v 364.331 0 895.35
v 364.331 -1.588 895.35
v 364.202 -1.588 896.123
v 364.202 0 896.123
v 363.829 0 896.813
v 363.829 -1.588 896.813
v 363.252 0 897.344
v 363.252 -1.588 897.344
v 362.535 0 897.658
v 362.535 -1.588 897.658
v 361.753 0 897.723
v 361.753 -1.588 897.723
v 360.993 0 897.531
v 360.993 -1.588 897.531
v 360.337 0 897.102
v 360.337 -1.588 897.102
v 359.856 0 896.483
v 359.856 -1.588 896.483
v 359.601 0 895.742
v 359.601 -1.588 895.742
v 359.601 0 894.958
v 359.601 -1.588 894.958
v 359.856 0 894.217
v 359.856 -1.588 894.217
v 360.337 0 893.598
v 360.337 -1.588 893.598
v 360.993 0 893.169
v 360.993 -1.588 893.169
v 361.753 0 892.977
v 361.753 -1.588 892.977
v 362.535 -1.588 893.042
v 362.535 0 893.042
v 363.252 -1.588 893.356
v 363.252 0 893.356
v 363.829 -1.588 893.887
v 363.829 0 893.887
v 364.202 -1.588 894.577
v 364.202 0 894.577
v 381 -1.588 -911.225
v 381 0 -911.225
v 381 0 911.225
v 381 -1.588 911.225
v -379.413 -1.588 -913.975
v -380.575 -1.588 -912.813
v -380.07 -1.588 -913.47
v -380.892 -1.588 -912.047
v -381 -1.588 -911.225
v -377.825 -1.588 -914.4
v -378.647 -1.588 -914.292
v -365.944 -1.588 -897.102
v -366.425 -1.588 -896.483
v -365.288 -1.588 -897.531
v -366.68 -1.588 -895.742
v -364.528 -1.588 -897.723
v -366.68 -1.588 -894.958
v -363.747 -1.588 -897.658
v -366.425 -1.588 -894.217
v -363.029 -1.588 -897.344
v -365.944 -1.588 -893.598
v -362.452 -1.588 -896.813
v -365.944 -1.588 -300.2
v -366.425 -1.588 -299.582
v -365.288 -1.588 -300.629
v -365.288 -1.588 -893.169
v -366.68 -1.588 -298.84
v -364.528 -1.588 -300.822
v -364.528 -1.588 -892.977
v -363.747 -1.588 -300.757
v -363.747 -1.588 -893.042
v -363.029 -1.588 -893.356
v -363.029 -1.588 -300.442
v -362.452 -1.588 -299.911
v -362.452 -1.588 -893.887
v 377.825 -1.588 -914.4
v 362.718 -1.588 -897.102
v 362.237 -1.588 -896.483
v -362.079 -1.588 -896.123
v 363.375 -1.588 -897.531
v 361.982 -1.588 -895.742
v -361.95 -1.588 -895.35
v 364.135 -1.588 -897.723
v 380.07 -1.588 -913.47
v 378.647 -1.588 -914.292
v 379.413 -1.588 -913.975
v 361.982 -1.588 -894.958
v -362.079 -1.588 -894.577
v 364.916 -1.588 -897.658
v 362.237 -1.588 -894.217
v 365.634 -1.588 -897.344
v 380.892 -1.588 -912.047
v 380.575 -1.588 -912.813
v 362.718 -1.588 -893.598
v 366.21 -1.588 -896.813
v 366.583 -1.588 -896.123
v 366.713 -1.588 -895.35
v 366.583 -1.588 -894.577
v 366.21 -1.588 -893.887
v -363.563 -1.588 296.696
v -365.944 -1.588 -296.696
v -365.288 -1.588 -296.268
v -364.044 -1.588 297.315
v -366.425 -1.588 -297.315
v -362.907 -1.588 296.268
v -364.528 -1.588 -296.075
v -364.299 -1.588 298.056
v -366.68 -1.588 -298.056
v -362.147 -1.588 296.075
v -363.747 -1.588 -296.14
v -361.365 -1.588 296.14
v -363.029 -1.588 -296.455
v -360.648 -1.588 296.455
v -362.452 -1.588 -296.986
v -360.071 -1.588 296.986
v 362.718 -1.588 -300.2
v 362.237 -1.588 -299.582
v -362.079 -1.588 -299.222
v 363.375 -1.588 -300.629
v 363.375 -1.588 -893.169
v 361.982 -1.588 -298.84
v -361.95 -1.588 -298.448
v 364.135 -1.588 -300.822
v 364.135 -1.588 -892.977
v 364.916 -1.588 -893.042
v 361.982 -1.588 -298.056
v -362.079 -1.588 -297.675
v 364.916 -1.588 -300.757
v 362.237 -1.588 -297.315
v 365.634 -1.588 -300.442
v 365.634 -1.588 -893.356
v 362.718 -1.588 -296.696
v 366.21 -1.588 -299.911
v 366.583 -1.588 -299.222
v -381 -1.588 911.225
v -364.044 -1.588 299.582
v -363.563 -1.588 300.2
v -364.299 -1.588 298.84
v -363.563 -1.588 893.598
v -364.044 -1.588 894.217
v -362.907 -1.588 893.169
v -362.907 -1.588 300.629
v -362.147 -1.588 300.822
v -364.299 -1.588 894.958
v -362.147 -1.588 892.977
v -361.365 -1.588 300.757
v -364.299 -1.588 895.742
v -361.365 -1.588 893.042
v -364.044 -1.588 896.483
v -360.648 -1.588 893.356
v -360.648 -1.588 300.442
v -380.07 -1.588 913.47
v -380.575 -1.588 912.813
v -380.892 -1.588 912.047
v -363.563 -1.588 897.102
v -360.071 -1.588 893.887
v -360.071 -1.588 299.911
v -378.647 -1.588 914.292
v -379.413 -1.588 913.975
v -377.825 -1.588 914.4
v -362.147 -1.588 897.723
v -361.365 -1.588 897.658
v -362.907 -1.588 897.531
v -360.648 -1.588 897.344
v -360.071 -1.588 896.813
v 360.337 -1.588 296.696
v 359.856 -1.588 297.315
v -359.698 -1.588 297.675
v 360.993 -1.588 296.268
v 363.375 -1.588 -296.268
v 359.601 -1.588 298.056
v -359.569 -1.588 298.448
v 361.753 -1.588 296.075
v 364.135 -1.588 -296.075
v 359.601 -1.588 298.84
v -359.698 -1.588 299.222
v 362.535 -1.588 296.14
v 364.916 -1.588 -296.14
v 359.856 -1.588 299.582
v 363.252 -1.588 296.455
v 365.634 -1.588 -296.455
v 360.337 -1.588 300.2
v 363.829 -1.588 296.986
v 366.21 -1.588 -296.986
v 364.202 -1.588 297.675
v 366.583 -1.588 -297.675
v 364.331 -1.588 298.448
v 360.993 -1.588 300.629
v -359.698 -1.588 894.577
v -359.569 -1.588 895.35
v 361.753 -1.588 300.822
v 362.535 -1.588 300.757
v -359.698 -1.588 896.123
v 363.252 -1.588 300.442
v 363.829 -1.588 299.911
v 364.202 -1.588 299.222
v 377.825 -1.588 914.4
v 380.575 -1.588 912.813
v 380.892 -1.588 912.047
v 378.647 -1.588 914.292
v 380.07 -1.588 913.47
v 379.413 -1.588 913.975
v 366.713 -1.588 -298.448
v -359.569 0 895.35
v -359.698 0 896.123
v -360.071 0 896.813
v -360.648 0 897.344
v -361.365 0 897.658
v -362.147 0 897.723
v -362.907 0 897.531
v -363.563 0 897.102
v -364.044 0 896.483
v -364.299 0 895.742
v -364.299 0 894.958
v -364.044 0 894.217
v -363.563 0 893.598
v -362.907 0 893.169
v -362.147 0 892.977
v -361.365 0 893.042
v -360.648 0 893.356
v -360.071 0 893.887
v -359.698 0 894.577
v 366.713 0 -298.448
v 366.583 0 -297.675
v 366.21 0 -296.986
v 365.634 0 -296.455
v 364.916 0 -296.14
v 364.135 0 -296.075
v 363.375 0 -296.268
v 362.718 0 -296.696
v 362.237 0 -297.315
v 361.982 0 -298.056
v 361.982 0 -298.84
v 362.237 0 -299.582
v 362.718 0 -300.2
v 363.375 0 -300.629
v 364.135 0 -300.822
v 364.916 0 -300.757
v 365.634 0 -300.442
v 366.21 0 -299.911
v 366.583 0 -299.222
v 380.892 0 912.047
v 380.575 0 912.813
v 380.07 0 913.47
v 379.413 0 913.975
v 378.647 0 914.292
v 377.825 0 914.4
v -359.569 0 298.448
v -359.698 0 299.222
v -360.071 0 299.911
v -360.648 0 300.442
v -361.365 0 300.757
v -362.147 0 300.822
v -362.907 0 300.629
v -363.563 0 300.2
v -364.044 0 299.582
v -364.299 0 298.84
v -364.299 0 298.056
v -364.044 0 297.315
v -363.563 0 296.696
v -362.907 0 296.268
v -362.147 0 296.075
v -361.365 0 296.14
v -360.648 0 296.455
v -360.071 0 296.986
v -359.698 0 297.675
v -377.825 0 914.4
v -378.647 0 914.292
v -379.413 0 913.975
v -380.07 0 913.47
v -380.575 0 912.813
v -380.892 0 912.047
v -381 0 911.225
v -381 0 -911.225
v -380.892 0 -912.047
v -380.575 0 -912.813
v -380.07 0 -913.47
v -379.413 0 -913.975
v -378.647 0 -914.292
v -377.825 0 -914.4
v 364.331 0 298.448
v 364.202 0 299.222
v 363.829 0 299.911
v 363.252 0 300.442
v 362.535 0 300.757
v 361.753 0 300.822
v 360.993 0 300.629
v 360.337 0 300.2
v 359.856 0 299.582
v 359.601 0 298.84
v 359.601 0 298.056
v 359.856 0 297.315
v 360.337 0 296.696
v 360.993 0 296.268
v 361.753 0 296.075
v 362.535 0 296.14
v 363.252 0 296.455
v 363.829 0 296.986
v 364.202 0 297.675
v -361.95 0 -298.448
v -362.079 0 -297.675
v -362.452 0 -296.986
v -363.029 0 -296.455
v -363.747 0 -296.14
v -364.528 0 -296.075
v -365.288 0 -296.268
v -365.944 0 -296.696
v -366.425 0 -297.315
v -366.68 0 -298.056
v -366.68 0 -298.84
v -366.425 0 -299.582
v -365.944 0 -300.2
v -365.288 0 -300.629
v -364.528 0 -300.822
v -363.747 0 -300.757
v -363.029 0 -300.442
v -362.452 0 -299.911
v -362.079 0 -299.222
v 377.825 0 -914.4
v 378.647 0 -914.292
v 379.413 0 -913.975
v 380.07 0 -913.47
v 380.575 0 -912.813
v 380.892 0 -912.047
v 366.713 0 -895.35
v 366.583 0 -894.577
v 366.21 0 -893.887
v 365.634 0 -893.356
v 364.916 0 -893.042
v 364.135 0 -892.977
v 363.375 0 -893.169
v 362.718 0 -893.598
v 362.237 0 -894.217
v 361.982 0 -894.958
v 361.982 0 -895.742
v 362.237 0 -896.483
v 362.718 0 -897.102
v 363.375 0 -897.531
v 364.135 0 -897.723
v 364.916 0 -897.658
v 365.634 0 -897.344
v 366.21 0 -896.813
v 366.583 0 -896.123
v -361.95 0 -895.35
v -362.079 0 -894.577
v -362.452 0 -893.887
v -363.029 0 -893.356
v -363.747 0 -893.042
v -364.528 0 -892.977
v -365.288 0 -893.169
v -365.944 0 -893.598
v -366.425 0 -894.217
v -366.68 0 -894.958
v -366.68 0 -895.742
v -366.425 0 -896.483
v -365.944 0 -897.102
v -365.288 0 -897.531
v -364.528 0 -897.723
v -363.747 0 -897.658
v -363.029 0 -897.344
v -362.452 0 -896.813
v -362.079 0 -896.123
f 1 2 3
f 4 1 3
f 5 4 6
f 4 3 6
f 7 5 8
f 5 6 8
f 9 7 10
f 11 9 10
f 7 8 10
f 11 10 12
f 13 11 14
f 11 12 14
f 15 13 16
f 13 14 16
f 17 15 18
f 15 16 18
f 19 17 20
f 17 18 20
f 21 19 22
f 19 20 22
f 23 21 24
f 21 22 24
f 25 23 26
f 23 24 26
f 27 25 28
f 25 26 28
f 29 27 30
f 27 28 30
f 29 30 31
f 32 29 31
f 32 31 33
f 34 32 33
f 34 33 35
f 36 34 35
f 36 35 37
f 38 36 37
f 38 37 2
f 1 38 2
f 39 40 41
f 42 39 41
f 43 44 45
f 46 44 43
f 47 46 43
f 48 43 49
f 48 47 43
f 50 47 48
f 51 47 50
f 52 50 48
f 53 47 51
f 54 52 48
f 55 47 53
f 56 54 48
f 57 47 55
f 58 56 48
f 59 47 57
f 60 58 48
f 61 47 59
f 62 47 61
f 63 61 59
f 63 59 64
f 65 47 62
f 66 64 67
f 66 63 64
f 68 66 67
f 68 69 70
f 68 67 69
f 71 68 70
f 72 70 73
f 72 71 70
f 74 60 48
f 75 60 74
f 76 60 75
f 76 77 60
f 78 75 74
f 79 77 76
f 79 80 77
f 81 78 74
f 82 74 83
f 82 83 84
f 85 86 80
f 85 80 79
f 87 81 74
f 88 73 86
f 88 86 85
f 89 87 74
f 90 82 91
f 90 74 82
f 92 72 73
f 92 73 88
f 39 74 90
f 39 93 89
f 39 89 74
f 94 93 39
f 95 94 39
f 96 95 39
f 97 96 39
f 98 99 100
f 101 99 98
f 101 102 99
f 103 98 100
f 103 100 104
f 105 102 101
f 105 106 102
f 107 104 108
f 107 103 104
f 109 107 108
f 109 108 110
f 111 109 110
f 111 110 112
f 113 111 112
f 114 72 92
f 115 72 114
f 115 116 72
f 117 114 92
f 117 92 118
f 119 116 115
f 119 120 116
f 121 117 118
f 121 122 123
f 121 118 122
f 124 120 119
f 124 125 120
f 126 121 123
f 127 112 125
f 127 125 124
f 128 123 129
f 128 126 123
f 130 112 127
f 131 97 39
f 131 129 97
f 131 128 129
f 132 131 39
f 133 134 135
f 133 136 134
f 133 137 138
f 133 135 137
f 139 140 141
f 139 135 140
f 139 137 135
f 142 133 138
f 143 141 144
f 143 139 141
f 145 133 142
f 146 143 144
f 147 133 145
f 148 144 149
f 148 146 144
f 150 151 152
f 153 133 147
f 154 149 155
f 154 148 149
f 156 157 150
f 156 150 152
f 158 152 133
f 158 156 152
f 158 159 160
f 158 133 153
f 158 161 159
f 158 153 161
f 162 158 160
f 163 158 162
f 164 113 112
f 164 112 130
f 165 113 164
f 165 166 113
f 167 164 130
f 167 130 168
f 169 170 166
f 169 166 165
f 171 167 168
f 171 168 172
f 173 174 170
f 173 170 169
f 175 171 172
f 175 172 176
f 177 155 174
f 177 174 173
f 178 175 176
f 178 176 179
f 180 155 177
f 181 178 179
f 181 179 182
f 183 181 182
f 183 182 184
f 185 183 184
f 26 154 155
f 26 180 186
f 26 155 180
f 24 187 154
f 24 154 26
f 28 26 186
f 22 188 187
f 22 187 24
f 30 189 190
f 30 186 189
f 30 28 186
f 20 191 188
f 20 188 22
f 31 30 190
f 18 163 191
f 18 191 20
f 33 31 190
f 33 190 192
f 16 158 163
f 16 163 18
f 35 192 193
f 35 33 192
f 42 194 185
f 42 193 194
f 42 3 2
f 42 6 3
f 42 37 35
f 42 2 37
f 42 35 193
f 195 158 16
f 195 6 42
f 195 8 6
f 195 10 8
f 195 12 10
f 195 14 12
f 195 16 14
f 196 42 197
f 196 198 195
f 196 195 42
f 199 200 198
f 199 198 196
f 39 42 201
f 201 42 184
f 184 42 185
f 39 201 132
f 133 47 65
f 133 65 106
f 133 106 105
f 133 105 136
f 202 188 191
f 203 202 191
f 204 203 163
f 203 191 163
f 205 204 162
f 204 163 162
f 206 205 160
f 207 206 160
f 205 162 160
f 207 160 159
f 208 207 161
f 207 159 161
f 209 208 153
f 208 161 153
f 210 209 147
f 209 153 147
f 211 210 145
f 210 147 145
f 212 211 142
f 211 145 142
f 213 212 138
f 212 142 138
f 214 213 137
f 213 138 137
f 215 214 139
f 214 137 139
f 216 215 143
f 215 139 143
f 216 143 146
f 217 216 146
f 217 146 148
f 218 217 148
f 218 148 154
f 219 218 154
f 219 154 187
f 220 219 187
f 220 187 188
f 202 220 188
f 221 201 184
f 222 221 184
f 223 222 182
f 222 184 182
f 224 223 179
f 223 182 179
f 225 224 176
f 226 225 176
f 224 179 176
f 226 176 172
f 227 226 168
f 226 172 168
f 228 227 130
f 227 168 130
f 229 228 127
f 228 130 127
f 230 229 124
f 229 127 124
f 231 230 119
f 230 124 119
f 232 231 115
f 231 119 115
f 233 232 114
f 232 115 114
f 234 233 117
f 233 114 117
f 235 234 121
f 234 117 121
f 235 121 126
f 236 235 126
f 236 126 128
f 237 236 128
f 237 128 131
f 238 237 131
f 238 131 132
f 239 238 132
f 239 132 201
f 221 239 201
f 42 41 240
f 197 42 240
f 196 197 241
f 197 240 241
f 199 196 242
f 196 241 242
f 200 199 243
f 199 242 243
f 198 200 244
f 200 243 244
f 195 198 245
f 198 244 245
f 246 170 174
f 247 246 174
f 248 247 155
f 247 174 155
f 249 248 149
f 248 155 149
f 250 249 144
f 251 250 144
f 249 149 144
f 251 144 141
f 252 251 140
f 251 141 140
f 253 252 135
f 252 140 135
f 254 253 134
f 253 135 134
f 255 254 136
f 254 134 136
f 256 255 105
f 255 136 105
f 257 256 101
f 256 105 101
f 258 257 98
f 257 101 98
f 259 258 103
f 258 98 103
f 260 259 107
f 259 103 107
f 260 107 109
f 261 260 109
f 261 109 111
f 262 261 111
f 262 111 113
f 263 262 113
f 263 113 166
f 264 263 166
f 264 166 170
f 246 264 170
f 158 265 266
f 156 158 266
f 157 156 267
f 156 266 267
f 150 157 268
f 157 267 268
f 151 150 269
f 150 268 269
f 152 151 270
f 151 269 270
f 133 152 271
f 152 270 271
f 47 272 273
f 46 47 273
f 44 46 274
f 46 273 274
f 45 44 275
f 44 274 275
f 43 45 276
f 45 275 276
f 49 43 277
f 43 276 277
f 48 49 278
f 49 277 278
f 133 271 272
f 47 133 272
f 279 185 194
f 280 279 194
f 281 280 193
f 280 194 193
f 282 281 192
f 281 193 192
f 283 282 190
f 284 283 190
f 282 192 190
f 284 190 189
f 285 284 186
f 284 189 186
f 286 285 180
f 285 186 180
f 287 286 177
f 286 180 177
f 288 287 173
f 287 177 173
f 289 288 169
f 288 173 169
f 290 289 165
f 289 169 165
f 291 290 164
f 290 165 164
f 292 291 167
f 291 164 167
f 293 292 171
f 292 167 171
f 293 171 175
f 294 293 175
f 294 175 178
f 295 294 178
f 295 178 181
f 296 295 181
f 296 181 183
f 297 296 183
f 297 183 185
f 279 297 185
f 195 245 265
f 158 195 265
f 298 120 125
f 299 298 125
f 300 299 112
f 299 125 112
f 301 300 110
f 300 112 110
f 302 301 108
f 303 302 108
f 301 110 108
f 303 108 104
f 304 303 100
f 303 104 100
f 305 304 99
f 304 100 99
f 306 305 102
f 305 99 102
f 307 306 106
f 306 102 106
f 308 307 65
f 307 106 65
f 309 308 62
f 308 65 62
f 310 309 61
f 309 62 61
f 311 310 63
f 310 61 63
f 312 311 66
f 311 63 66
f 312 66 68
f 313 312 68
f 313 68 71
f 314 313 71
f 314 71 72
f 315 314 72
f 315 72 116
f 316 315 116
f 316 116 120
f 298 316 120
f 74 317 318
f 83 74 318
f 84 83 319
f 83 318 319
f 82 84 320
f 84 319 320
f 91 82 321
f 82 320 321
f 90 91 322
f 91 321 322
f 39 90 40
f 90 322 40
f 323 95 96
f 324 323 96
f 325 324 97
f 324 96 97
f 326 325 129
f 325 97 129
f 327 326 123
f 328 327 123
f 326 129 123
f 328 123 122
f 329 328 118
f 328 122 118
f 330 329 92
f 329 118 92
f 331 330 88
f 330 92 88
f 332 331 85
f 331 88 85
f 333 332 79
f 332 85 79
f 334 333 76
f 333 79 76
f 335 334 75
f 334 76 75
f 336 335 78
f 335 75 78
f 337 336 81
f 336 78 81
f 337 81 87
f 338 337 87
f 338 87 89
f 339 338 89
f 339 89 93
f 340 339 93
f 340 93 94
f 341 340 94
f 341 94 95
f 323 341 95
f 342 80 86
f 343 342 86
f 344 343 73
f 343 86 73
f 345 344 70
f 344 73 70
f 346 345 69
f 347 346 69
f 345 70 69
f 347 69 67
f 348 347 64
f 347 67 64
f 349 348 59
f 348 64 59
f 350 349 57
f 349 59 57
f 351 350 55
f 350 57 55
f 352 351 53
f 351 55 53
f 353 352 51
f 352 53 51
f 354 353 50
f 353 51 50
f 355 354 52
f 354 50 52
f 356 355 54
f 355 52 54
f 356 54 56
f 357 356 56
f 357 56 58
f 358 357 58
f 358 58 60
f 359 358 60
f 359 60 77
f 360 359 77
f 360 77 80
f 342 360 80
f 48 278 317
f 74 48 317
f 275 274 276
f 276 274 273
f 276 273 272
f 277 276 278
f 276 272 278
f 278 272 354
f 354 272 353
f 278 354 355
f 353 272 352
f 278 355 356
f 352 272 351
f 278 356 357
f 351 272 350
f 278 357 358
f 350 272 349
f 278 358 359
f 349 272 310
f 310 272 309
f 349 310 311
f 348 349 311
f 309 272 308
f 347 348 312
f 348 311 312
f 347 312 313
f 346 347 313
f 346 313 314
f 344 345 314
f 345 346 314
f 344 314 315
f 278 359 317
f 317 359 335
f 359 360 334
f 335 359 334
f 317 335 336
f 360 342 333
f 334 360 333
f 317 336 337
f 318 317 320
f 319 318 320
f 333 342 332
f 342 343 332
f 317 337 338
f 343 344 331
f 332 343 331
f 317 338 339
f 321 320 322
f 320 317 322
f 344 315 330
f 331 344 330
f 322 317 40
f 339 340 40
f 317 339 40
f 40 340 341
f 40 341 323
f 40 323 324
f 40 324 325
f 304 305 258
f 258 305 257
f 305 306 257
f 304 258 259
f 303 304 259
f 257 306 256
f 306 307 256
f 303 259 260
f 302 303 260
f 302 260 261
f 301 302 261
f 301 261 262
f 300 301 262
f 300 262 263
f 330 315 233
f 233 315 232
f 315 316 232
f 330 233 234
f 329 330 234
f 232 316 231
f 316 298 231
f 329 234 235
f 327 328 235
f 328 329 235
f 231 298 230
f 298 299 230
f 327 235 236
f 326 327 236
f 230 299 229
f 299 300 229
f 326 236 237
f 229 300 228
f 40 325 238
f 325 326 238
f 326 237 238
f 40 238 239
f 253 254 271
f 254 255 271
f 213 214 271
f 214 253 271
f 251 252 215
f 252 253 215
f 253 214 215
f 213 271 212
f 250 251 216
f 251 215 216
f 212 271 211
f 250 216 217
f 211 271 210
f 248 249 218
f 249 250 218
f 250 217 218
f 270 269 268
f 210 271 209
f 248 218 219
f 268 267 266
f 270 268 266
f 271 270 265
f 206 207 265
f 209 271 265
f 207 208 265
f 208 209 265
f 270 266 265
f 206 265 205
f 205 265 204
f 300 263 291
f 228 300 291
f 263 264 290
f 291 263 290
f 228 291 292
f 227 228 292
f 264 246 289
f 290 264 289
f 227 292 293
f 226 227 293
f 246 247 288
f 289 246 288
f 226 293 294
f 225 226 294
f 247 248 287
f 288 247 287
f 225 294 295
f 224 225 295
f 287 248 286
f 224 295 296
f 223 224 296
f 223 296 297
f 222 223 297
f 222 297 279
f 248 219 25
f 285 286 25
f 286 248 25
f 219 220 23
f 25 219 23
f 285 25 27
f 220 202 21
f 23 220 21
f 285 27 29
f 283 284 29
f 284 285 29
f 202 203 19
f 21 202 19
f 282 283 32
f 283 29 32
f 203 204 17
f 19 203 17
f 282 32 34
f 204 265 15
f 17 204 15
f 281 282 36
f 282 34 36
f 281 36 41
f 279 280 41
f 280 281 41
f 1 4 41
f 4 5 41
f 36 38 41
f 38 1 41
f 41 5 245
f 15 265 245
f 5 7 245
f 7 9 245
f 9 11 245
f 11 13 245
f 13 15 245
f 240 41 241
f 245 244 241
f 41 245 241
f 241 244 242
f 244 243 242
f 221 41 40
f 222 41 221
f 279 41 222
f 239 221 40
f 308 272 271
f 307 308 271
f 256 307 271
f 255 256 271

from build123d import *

# Parameters (mm, degrees)
F1_DEPTH = 1.5875
F2_R     = 2.38125
F3_DEPTH = 1.5885


# Not quite as in the source:
# - a length typed as a fraction of an inch, garbled in the dataset ("3 / 203.2 mm" for 3/8 in), is restored


with BuildPart() as f1:
    # F0 (on Front) → F1 (new body)
    with BuildSketch(Plane.XZ):
        with BuildLine():
            Line((-377.825, -914.4), (377.825, -914.4))
            ThreePointArc((377.825, -914.4), (380.0700640303, -913.4700640303), (381, -911.225))
            Line((381, -911.225), (381, 911.225))
            ThreePointArc((381, 911.225), (380.0700640303, 913.4700640303), (377.825, 914.4))
            Line((377.825, 914.4), (-377.825, 914.4))
            ThreePointArc((-377.825, 914.4), (-380.0700640303, 913.4700640303), (-381, 911.225))
            Line((-381, 911.225), (-381, -911.225))
            ThreePointArc((-381, -911.225), (-380.0700640303, -913.4700640303), (-377.825, -914.4))
        make_face()
    extrude(amount=F1_DEPTH)

    # F2 (on face) → F3 (cut, through all)
    with BuildSketch(Plane.XZ.offset(1.5875)):
        with Locations((-361.95, 895.35)):
            Circle(F2_R)
        with Locations((-361.95, 298.44841672)):
            Circle(F2_R)
        with Locations((-364.33125, -298.44841672)):
            Circle(F2_R)
        with Locations((-364.33125, -895.35)):
            Circle(F2_R)
        with Locations((361.95, 895.35)):
            Circle(F2_R)
        with Locations((364.33125, -895.35)):
            Circle(F2_R)
        with Locations((361.95, 298.44841672)):
            Circle(F2_R)
        with Locations((364.33125, -298.44841672)):
            Circle(F2_R)
    extrude(amount=-F3_DEPTH, mode=Mode.SUBTRACT)


solid = f1.part
